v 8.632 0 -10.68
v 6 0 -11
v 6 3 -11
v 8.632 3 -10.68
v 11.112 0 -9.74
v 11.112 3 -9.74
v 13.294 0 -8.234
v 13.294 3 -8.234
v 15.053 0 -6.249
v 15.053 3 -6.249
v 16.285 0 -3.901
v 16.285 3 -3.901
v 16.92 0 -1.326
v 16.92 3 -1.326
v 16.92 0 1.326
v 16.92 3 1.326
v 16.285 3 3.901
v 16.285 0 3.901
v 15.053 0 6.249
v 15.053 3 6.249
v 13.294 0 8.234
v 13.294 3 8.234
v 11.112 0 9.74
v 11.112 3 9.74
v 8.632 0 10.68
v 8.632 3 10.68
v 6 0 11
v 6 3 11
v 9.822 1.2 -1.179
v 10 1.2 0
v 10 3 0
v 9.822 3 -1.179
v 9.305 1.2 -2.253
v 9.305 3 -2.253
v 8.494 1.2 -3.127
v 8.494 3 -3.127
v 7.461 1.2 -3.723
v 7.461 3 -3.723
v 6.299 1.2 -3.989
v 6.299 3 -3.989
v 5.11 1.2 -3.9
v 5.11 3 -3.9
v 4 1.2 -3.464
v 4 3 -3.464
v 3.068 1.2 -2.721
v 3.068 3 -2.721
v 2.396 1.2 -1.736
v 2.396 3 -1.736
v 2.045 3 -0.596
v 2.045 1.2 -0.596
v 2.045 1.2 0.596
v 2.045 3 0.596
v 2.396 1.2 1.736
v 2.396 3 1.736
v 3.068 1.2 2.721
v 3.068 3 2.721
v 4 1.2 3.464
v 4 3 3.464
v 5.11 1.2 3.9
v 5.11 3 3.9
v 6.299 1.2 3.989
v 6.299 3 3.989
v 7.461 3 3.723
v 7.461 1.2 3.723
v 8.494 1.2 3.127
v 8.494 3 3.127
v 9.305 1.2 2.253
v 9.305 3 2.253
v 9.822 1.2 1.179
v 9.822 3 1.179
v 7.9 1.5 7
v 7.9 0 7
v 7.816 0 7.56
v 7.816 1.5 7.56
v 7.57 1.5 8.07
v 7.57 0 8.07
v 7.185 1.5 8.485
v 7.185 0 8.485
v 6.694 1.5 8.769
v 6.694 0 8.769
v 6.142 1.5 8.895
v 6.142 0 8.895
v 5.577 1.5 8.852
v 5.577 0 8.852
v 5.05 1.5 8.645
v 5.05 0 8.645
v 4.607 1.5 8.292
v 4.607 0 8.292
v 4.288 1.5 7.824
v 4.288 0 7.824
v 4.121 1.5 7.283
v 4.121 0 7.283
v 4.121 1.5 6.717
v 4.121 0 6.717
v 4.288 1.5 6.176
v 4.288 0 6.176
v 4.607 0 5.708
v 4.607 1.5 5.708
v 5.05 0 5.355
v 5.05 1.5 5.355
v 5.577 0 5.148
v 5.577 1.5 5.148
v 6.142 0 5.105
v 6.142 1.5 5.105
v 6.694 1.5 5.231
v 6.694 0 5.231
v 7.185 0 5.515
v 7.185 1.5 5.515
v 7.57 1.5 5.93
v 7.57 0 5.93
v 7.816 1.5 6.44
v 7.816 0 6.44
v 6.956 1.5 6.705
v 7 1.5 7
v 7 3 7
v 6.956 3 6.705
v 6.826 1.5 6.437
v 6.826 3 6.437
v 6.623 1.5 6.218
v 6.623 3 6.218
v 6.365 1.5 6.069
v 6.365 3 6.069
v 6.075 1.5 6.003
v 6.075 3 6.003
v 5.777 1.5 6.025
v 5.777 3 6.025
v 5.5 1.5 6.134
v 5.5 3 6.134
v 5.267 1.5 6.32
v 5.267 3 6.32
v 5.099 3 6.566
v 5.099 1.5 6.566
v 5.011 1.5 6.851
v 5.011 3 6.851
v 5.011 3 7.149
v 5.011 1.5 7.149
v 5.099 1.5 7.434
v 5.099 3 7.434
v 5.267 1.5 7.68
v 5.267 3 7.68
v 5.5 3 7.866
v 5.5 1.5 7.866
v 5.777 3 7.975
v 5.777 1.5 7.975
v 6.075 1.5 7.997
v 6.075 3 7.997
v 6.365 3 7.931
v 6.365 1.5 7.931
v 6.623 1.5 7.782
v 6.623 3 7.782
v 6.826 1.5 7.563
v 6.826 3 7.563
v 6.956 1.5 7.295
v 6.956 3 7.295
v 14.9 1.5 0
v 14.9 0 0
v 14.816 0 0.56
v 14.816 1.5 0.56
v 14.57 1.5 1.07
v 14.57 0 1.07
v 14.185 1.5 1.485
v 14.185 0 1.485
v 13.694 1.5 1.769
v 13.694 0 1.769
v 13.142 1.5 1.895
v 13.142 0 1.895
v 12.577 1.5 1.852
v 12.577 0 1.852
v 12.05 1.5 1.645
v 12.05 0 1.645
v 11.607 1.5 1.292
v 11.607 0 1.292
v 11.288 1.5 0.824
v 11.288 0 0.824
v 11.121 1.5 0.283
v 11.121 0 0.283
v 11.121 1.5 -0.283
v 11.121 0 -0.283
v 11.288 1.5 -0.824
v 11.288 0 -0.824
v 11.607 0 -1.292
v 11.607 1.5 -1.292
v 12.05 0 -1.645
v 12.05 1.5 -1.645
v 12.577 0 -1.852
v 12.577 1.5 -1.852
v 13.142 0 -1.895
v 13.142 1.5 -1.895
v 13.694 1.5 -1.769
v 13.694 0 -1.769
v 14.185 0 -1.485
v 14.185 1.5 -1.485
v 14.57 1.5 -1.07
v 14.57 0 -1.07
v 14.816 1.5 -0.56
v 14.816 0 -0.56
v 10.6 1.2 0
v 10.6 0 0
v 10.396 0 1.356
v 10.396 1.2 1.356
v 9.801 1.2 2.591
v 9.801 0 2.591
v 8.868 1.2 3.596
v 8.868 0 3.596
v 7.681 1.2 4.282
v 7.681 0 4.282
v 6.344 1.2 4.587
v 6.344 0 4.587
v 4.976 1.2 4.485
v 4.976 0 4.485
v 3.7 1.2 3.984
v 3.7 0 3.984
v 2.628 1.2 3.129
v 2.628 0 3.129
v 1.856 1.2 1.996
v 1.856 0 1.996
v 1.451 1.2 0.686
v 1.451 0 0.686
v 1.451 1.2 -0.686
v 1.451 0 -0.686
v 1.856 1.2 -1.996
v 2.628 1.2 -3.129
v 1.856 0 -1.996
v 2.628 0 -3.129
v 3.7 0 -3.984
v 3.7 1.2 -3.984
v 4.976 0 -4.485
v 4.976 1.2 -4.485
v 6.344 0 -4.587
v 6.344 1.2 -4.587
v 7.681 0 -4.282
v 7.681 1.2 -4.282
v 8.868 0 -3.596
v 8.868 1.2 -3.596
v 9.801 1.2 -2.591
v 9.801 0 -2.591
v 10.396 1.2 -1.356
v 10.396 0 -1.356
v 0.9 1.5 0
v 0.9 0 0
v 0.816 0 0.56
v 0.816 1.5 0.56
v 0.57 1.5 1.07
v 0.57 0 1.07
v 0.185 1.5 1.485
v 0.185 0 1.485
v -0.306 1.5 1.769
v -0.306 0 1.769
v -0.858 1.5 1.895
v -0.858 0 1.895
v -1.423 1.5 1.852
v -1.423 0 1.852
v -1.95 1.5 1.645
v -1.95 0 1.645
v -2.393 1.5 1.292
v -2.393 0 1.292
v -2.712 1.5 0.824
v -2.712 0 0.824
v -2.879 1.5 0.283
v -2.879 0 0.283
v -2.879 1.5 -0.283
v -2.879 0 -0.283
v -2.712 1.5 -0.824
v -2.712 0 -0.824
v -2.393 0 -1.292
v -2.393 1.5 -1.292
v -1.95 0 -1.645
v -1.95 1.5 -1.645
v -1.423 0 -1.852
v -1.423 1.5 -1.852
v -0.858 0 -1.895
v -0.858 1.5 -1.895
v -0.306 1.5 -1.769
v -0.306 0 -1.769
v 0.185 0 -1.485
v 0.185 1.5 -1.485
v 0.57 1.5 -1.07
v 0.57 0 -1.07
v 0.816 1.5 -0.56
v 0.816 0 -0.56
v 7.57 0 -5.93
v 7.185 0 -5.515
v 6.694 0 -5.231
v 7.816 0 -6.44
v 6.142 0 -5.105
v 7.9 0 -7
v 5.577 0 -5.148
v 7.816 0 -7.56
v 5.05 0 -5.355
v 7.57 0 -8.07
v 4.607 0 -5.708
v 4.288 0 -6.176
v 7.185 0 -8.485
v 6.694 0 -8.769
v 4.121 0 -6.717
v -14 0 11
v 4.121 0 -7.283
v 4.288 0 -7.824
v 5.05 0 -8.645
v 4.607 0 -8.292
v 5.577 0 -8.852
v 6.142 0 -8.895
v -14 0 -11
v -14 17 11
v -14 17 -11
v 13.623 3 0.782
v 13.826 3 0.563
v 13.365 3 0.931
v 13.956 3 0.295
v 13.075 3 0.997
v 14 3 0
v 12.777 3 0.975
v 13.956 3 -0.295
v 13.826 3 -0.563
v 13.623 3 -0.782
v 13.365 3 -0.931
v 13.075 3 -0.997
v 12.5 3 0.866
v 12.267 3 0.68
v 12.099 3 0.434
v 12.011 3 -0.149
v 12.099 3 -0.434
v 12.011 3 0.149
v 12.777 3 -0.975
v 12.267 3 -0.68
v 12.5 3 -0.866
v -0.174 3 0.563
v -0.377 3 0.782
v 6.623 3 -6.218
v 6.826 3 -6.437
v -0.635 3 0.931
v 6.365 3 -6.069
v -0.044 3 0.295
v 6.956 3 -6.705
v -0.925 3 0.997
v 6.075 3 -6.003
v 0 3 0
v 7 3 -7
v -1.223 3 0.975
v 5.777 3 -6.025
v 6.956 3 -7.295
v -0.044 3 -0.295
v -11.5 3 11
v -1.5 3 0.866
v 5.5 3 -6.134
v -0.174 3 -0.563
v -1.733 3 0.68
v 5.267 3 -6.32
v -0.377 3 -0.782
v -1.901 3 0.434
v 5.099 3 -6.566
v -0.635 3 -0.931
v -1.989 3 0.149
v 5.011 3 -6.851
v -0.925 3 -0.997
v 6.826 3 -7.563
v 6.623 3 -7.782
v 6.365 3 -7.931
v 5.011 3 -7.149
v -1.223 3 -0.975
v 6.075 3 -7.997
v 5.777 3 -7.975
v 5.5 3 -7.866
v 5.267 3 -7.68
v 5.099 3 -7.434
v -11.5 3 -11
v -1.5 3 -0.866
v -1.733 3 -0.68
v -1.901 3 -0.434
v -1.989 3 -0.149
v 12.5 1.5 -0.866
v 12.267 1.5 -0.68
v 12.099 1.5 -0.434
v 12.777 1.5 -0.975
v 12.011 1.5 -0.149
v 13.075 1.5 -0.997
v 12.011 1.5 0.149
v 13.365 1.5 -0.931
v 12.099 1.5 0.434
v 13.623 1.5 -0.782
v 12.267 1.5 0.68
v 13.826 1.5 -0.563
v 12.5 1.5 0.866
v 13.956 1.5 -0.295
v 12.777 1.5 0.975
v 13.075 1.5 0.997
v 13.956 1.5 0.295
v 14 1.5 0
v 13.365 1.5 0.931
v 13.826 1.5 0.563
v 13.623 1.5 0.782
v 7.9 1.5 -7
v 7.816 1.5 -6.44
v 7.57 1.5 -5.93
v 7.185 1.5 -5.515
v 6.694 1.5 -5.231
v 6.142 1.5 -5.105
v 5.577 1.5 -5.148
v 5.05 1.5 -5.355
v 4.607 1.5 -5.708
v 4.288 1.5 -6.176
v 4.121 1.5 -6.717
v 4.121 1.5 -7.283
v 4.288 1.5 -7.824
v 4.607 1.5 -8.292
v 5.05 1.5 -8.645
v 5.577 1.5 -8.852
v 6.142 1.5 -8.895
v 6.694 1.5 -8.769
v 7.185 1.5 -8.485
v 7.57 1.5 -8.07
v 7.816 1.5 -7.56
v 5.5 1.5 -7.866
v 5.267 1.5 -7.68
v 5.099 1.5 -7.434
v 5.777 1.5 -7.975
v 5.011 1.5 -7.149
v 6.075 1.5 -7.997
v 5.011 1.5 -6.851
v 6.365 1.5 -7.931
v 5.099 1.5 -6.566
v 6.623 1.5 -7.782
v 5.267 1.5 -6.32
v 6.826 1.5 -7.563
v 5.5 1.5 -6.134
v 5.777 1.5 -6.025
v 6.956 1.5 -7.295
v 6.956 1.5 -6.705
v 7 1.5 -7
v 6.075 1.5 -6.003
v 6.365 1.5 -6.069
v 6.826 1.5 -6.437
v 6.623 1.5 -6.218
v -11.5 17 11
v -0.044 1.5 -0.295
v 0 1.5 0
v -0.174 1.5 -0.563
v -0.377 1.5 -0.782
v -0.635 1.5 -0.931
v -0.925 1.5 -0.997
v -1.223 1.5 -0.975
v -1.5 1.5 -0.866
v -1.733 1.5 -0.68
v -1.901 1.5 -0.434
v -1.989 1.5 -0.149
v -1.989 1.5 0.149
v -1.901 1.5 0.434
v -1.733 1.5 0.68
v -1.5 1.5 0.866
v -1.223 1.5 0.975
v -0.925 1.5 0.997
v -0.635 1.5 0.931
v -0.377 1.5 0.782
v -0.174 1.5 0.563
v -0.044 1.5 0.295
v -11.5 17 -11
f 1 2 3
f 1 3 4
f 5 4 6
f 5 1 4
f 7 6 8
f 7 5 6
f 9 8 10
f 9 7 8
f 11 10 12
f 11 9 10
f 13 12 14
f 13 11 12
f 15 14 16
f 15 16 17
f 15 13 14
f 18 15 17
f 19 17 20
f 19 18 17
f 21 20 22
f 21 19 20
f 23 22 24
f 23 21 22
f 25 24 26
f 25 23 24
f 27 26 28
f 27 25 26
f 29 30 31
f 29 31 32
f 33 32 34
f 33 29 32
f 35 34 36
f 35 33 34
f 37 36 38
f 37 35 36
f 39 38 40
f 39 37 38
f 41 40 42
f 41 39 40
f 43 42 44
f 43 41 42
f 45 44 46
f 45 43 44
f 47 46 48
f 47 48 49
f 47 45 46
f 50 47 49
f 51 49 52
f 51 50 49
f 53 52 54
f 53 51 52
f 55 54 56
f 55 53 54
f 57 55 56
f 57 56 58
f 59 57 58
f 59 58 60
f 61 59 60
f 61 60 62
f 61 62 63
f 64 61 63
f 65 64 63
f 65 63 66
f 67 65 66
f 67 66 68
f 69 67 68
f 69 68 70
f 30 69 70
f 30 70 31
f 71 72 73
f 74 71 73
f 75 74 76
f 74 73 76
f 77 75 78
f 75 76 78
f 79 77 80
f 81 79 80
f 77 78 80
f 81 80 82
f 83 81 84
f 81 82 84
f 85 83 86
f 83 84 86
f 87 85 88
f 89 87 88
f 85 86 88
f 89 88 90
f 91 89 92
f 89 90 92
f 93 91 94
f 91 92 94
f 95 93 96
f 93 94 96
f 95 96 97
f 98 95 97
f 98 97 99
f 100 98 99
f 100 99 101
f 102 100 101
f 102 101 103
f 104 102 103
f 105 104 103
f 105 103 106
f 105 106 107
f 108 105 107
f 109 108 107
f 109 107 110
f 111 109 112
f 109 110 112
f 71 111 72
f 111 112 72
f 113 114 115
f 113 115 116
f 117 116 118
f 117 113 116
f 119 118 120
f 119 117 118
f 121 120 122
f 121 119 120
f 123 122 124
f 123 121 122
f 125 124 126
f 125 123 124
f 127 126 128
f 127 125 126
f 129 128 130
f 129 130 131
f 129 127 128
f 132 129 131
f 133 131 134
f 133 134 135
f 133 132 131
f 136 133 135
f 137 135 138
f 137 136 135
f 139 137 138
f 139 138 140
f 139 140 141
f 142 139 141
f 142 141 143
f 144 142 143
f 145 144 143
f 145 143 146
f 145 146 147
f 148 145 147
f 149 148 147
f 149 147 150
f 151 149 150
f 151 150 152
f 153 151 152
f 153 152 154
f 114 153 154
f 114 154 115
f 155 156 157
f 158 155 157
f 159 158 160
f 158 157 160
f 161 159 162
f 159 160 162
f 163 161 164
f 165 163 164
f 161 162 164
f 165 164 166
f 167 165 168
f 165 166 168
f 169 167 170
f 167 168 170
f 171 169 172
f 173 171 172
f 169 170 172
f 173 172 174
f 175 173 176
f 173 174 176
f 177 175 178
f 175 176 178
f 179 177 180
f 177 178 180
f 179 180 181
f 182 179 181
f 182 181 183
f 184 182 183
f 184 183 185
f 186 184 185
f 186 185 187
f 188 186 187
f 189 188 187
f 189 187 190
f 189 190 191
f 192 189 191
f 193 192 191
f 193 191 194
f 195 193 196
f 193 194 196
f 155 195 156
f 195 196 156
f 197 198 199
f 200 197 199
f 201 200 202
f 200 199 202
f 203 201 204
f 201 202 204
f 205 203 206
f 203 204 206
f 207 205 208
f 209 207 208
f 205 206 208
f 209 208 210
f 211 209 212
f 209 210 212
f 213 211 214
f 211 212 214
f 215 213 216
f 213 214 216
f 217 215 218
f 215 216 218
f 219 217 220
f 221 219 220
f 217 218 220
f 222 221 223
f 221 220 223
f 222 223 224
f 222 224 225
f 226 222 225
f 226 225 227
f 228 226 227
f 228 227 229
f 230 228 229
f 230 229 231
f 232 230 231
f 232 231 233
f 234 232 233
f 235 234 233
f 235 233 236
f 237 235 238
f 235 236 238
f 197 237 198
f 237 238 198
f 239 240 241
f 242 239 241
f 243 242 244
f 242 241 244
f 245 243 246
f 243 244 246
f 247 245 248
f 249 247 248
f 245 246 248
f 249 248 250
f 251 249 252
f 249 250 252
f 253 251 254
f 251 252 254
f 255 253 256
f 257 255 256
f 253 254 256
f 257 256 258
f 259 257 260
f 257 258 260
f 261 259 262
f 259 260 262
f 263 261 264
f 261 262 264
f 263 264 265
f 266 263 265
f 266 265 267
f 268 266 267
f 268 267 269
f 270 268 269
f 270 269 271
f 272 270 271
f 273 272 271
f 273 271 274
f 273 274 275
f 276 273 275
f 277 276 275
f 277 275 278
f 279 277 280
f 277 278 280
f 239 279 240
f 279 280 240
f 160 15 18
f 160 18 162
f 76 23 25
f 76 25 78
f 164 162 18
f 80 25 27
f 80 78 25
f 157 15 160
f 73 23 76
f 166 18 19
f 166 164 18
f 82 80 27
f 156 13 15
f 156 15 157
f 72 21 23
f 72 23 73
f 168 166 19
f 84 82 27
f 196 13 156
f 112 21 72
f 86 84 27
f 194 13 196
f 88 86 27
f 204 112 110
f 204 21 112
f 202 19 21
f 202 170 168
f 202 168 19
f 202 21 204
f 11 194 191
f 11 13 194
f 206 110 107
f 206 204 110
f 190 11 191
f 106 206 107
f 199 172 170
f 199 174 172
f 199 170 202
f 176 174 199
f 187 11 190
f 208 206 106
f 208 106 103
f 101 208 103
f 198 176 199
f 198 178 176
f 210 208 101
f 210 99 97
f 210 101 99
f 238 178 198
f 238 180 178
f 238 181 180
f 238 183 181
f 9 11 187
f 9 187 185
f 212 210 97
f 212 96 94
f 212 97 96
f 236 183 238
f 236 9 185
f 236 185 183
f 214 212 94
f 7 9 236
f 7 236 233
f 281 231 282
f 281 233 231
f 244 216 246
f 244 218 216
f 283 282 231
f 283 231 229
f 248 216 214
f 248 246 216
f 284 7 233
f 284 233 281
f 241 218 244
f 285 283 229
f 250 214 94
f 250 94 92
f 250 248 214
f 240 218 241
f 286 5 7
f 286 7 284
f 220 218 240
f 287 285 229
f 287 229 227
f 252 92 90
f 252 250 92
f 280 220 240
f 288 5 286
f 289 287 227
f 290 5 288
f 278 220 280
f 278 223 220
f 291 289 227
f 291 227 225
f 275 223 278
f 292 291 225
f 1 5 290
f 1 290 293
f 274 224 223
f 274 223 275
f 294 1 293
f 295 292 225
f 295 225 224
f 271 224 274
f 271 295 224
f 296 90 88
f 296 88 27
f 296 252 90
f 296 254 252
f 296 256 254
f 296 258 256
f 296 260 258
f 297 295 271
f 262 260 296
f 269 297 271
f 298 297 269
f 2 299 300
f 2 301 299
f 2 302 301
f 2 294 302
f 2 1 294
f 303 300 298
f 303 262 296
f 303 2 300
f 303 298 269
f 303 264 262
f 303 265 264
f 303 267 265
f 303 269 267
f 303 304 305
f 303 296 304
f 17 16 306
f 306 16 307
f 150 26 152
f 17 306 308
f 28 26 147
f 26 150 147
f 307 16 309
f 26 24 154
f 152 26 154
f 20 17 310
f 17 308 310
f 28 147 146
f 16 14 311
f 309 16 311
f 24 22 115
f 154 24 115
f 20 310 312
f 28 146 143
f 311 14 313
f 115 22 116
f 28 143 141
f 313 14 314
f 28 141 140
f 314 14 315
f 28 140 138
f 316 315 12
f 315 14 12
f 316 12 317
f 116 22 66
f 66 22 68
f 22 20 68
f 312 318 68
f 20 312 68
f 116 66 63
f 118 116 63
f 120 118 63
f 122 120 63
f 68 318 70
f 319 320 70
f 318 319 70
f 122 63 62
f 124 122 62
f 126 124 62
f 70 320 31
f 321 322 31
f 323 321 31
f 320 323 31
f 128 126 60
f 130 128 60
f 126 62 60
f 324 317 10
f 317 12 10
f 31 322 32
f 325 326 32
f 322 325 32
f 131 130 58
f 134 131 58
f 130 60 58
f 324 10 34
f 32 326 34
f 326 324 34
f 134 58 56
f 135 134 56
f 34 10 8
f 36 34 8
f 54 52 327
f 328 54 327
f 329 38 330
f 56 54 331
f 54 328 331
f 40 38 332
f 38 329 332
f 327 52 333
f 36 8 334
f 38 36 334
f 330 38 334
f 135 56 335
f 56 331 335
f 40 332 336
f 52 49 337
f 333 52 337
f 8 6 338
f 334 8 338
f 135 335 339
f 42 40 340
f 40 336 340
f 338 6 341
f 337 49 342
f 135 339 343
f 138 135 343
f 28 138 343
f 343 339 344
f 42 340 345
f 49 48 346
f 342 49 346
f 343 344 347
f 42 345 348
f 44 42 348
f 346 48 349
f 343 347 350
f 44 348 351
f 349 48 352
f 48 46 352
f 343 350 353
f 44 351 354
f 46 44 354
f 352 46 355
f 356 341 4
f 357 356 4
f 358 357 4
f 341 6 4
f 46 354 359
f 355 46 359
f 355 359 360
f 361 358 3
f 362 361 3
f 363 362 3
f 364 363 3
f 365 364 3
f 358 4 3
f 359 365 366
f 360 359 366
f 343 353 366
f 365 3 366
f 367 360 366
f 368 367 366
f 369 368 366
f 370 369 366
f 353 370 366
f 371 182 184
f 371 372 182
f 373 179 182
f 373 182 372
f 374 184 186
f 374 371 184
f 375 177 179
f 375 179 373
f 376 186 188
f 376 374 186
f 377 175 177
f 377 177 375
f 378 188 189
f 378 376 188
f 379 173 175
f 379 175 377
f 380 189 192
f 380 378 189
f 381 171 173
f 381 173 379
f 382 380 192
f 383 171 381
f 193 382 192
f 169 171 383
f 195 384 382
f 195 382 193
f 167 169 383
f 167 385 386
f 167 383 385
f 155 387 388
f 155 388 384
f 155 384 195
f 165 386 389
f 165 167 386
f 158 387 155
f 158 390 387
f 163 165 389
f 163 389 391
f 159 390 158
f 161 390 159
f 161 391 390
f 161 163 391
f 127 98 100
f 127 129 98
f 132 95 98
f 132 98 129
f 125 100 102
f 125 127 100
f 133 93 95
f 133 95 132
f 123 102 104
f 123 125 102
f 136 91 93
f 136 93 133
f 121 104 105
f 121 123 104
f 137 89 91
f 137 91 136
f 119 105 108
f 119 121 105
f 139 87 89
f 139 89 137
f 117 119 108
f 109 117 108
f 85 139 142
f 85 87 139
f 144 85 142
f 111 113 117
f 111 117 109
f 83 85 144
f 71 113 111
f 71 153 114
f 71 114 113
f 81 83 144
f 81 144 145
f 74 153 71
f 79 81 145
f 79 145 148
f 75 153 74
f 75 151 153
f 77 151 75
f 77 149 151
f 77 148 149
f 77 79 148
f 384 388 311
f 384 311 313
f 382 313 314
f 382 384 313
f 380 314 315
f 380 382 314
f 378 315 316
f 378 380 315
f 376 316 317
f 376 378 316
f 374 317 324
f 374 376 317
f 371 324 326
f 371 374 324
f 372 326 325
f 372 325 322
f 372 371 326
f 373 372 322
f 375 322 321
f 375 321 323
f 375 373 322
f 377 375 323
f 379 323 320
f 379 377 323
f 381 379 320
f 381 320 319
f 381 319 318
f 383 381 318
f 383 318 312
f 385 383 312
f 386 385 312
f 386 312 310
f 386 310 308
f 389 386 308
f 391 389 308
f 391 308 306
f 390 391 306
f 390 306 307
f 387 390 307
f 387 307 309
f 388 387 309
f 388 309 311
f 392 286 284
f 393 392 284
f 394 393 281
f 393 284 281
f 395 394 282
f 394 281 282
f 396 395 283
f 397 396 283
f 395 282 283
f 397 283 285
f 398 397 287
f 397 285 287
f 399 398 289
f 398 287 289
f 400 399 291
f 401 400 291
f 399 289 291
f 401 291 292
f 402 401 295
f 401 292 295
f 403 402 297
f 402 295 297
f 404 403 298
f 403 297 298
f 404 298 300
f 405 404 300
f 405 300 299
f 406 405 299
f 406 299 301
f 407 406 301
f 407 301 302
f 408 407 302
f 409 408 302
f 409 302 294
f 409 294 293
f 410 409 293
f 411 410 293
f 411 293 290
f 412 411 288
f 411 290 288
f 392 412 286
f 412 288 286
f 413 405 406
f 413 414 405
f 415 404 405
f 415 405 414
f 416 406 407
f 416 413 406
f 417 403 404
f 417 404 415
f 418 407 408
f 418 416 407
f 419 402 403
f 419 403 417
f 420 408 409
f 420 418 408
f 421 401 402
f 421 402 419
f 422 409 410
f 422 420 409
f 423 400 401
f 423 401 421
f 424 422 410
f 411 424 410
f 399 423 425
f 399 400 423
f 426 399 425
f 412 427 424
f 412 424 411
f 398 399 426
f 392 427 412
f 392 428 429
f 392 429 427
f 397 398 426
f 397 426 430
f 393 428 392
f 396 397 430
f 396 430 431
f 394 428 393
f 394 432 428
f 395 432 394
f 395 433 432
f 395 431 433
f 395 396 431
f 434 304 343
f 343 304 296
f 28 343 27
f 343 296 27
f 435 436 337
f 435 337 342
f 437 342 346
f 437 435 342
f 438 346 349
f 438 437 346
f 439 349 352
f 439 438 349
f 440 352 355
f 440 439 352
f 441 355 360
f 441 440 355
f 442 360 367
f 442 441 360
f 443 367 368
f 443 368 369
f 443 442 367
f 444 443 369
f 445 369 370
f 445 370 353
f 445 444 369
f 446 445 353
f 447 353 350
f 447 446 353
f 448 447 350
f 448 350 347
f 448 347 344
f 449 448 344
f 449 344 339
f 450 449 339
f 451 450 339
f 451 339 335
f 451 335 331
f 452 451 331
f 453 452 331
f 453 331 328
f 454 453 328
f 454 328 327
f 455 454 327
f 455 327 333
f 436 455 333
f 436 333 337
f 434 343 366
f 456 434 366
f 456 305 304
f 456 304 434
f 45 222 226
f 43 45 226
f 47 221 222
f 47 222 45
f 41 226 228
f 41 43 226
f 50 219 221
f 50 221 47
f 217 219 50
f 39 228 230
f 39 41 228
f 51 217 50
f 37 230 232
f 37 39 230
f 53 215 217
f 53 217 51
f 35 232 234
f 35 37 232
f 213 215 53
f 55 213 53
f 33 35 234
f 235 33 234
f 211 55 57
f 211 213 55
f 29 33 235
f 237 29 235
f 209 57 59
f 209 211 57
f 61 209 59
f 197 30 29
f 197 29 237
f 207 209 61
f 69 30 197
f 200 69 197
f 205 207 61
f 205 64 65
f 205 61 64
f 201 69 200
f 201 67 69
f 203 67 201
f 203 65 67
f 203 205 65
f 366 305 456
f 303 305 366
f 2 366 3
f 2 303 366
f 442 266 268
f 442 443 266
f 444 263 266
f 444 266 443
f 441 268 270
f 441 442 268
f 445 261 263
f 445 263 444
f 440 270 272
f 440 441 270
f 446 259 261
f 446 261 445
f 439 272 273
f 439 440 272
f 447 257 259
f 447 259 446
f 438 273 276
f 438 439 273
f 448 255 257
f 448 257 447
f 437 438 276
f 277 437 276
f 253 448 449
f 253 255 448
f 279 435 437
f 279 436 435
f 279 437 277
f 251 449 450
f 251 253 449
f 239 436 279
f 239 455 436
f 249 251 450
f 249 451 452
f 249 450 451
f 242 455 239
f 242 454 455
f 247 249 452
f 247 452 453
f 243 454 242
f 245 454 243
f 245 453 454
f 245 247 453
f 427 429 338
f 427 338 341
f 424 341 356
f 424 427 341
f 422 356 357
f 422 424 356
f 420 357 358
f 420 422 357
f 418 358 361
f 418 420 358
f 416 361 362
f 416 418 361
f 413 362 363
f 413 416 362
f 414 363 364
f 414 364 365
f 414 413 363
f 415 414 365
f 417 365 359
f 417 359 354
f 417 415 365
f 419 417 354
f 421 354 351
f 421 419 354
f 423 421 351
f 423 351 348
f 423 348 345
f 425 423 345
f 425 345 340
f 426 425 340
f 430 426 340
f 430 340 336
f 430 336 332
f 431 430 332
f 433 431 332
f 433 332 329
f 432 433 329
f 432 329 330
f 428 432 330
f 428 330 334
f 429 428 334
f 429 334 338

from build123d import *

# Parameters (mm, degrees)
SKETCH1_R           = 1
SKETCH1_R_2         = 4
BOSS_EXTRUDE1_DEPTH = 3
SKETCH2_W           = 2.5
SKETCH2_H           = 22
BOSS_EXTRUDE2_DEPTH = 14
SKETCH4_R           = 4.6
CUT_EXTRUDE2_DEPTH  = 1.2
SKETCH5_R           = 1.9
CUT_EXTRUDE3_DEPTH  = 1.5


with BuildPart() as part:
    # Sketch1 → Boss-Extrude1 (new body)
    with BuildSketch(Plane(origin=(0, 0, 0), x_dir=(1, 0, 0), z_dir=(0, 1, 0))):
        with BuildLine():
            Line((-14, -11), (-14, 11))
            Line((-14, 11), (6, 11))
            ThreePointArc((6, 11), (17, 0), (6, -11))
            Line((6, -11), (-14, -11))
        make_face()
        with Locations((6, -7)):
            Circle(SKETCH1_R, mode=Mode.SUBTRACT)
        with Locations((-1, 0)):
            Circle(SKETCH1_R, mode=Mode.SUBTRACT)
        with Locations((6, 0)):
            Circle(SKETCH1_R_2, mode=Mode.SUBTRACT)
        with Locations((13, 0)):
            Circle(SKETCH1_R, mode=Mode.SUBTRACT)
        with Locations((6, 7)):
            Circle(SKETCH1_R, mode=Mode.SUBTRACT)
    extrude(amount=BOSS_EXTRUDE1_DEPTH)

    # Sketch2 → Boss-Extrude2 (add)
    with BuildSketch(Plane(origin=(0, 3, 0), x_dir=(1, 0, 0), z_dir=(0, 1, 0))):
        with Locations((-12.75, 0)):
            Rectangle(SKETCH2_W, SKETCH2_H)
    extrude(amount=BOSS_EXTRUDE2_DEPTH)

    # Sketch4 → Cut-Extrude2 (cut)
    with BuildSketch(Plane.XZ):
        with Locations((6, 0)):
            Circle(SKETCH4_R)
    extrude(amount=-CUT_EXTRUDE2_DEPTH, mode=Mode.SUBTRACT)

    # Sketch5 → Cut-Extrude3 (cut)
    with BuildSketch(Plane.XZ):
        with Locations((13, 0)):
            Circle(SKETCH5_R)
        with Locations((6, -7)):
            Circle(SKETCH5_R)
        with Locations((-1, 0)):
            Circle(SKETCH5_R)
        with Locations((6, 7)):
            Circle(SKETCH5_R)
    extrude(amount=-CUT_EXTRUDE3_DEPTH, mode=Mode.SUBTRACT)


solid = part.part
